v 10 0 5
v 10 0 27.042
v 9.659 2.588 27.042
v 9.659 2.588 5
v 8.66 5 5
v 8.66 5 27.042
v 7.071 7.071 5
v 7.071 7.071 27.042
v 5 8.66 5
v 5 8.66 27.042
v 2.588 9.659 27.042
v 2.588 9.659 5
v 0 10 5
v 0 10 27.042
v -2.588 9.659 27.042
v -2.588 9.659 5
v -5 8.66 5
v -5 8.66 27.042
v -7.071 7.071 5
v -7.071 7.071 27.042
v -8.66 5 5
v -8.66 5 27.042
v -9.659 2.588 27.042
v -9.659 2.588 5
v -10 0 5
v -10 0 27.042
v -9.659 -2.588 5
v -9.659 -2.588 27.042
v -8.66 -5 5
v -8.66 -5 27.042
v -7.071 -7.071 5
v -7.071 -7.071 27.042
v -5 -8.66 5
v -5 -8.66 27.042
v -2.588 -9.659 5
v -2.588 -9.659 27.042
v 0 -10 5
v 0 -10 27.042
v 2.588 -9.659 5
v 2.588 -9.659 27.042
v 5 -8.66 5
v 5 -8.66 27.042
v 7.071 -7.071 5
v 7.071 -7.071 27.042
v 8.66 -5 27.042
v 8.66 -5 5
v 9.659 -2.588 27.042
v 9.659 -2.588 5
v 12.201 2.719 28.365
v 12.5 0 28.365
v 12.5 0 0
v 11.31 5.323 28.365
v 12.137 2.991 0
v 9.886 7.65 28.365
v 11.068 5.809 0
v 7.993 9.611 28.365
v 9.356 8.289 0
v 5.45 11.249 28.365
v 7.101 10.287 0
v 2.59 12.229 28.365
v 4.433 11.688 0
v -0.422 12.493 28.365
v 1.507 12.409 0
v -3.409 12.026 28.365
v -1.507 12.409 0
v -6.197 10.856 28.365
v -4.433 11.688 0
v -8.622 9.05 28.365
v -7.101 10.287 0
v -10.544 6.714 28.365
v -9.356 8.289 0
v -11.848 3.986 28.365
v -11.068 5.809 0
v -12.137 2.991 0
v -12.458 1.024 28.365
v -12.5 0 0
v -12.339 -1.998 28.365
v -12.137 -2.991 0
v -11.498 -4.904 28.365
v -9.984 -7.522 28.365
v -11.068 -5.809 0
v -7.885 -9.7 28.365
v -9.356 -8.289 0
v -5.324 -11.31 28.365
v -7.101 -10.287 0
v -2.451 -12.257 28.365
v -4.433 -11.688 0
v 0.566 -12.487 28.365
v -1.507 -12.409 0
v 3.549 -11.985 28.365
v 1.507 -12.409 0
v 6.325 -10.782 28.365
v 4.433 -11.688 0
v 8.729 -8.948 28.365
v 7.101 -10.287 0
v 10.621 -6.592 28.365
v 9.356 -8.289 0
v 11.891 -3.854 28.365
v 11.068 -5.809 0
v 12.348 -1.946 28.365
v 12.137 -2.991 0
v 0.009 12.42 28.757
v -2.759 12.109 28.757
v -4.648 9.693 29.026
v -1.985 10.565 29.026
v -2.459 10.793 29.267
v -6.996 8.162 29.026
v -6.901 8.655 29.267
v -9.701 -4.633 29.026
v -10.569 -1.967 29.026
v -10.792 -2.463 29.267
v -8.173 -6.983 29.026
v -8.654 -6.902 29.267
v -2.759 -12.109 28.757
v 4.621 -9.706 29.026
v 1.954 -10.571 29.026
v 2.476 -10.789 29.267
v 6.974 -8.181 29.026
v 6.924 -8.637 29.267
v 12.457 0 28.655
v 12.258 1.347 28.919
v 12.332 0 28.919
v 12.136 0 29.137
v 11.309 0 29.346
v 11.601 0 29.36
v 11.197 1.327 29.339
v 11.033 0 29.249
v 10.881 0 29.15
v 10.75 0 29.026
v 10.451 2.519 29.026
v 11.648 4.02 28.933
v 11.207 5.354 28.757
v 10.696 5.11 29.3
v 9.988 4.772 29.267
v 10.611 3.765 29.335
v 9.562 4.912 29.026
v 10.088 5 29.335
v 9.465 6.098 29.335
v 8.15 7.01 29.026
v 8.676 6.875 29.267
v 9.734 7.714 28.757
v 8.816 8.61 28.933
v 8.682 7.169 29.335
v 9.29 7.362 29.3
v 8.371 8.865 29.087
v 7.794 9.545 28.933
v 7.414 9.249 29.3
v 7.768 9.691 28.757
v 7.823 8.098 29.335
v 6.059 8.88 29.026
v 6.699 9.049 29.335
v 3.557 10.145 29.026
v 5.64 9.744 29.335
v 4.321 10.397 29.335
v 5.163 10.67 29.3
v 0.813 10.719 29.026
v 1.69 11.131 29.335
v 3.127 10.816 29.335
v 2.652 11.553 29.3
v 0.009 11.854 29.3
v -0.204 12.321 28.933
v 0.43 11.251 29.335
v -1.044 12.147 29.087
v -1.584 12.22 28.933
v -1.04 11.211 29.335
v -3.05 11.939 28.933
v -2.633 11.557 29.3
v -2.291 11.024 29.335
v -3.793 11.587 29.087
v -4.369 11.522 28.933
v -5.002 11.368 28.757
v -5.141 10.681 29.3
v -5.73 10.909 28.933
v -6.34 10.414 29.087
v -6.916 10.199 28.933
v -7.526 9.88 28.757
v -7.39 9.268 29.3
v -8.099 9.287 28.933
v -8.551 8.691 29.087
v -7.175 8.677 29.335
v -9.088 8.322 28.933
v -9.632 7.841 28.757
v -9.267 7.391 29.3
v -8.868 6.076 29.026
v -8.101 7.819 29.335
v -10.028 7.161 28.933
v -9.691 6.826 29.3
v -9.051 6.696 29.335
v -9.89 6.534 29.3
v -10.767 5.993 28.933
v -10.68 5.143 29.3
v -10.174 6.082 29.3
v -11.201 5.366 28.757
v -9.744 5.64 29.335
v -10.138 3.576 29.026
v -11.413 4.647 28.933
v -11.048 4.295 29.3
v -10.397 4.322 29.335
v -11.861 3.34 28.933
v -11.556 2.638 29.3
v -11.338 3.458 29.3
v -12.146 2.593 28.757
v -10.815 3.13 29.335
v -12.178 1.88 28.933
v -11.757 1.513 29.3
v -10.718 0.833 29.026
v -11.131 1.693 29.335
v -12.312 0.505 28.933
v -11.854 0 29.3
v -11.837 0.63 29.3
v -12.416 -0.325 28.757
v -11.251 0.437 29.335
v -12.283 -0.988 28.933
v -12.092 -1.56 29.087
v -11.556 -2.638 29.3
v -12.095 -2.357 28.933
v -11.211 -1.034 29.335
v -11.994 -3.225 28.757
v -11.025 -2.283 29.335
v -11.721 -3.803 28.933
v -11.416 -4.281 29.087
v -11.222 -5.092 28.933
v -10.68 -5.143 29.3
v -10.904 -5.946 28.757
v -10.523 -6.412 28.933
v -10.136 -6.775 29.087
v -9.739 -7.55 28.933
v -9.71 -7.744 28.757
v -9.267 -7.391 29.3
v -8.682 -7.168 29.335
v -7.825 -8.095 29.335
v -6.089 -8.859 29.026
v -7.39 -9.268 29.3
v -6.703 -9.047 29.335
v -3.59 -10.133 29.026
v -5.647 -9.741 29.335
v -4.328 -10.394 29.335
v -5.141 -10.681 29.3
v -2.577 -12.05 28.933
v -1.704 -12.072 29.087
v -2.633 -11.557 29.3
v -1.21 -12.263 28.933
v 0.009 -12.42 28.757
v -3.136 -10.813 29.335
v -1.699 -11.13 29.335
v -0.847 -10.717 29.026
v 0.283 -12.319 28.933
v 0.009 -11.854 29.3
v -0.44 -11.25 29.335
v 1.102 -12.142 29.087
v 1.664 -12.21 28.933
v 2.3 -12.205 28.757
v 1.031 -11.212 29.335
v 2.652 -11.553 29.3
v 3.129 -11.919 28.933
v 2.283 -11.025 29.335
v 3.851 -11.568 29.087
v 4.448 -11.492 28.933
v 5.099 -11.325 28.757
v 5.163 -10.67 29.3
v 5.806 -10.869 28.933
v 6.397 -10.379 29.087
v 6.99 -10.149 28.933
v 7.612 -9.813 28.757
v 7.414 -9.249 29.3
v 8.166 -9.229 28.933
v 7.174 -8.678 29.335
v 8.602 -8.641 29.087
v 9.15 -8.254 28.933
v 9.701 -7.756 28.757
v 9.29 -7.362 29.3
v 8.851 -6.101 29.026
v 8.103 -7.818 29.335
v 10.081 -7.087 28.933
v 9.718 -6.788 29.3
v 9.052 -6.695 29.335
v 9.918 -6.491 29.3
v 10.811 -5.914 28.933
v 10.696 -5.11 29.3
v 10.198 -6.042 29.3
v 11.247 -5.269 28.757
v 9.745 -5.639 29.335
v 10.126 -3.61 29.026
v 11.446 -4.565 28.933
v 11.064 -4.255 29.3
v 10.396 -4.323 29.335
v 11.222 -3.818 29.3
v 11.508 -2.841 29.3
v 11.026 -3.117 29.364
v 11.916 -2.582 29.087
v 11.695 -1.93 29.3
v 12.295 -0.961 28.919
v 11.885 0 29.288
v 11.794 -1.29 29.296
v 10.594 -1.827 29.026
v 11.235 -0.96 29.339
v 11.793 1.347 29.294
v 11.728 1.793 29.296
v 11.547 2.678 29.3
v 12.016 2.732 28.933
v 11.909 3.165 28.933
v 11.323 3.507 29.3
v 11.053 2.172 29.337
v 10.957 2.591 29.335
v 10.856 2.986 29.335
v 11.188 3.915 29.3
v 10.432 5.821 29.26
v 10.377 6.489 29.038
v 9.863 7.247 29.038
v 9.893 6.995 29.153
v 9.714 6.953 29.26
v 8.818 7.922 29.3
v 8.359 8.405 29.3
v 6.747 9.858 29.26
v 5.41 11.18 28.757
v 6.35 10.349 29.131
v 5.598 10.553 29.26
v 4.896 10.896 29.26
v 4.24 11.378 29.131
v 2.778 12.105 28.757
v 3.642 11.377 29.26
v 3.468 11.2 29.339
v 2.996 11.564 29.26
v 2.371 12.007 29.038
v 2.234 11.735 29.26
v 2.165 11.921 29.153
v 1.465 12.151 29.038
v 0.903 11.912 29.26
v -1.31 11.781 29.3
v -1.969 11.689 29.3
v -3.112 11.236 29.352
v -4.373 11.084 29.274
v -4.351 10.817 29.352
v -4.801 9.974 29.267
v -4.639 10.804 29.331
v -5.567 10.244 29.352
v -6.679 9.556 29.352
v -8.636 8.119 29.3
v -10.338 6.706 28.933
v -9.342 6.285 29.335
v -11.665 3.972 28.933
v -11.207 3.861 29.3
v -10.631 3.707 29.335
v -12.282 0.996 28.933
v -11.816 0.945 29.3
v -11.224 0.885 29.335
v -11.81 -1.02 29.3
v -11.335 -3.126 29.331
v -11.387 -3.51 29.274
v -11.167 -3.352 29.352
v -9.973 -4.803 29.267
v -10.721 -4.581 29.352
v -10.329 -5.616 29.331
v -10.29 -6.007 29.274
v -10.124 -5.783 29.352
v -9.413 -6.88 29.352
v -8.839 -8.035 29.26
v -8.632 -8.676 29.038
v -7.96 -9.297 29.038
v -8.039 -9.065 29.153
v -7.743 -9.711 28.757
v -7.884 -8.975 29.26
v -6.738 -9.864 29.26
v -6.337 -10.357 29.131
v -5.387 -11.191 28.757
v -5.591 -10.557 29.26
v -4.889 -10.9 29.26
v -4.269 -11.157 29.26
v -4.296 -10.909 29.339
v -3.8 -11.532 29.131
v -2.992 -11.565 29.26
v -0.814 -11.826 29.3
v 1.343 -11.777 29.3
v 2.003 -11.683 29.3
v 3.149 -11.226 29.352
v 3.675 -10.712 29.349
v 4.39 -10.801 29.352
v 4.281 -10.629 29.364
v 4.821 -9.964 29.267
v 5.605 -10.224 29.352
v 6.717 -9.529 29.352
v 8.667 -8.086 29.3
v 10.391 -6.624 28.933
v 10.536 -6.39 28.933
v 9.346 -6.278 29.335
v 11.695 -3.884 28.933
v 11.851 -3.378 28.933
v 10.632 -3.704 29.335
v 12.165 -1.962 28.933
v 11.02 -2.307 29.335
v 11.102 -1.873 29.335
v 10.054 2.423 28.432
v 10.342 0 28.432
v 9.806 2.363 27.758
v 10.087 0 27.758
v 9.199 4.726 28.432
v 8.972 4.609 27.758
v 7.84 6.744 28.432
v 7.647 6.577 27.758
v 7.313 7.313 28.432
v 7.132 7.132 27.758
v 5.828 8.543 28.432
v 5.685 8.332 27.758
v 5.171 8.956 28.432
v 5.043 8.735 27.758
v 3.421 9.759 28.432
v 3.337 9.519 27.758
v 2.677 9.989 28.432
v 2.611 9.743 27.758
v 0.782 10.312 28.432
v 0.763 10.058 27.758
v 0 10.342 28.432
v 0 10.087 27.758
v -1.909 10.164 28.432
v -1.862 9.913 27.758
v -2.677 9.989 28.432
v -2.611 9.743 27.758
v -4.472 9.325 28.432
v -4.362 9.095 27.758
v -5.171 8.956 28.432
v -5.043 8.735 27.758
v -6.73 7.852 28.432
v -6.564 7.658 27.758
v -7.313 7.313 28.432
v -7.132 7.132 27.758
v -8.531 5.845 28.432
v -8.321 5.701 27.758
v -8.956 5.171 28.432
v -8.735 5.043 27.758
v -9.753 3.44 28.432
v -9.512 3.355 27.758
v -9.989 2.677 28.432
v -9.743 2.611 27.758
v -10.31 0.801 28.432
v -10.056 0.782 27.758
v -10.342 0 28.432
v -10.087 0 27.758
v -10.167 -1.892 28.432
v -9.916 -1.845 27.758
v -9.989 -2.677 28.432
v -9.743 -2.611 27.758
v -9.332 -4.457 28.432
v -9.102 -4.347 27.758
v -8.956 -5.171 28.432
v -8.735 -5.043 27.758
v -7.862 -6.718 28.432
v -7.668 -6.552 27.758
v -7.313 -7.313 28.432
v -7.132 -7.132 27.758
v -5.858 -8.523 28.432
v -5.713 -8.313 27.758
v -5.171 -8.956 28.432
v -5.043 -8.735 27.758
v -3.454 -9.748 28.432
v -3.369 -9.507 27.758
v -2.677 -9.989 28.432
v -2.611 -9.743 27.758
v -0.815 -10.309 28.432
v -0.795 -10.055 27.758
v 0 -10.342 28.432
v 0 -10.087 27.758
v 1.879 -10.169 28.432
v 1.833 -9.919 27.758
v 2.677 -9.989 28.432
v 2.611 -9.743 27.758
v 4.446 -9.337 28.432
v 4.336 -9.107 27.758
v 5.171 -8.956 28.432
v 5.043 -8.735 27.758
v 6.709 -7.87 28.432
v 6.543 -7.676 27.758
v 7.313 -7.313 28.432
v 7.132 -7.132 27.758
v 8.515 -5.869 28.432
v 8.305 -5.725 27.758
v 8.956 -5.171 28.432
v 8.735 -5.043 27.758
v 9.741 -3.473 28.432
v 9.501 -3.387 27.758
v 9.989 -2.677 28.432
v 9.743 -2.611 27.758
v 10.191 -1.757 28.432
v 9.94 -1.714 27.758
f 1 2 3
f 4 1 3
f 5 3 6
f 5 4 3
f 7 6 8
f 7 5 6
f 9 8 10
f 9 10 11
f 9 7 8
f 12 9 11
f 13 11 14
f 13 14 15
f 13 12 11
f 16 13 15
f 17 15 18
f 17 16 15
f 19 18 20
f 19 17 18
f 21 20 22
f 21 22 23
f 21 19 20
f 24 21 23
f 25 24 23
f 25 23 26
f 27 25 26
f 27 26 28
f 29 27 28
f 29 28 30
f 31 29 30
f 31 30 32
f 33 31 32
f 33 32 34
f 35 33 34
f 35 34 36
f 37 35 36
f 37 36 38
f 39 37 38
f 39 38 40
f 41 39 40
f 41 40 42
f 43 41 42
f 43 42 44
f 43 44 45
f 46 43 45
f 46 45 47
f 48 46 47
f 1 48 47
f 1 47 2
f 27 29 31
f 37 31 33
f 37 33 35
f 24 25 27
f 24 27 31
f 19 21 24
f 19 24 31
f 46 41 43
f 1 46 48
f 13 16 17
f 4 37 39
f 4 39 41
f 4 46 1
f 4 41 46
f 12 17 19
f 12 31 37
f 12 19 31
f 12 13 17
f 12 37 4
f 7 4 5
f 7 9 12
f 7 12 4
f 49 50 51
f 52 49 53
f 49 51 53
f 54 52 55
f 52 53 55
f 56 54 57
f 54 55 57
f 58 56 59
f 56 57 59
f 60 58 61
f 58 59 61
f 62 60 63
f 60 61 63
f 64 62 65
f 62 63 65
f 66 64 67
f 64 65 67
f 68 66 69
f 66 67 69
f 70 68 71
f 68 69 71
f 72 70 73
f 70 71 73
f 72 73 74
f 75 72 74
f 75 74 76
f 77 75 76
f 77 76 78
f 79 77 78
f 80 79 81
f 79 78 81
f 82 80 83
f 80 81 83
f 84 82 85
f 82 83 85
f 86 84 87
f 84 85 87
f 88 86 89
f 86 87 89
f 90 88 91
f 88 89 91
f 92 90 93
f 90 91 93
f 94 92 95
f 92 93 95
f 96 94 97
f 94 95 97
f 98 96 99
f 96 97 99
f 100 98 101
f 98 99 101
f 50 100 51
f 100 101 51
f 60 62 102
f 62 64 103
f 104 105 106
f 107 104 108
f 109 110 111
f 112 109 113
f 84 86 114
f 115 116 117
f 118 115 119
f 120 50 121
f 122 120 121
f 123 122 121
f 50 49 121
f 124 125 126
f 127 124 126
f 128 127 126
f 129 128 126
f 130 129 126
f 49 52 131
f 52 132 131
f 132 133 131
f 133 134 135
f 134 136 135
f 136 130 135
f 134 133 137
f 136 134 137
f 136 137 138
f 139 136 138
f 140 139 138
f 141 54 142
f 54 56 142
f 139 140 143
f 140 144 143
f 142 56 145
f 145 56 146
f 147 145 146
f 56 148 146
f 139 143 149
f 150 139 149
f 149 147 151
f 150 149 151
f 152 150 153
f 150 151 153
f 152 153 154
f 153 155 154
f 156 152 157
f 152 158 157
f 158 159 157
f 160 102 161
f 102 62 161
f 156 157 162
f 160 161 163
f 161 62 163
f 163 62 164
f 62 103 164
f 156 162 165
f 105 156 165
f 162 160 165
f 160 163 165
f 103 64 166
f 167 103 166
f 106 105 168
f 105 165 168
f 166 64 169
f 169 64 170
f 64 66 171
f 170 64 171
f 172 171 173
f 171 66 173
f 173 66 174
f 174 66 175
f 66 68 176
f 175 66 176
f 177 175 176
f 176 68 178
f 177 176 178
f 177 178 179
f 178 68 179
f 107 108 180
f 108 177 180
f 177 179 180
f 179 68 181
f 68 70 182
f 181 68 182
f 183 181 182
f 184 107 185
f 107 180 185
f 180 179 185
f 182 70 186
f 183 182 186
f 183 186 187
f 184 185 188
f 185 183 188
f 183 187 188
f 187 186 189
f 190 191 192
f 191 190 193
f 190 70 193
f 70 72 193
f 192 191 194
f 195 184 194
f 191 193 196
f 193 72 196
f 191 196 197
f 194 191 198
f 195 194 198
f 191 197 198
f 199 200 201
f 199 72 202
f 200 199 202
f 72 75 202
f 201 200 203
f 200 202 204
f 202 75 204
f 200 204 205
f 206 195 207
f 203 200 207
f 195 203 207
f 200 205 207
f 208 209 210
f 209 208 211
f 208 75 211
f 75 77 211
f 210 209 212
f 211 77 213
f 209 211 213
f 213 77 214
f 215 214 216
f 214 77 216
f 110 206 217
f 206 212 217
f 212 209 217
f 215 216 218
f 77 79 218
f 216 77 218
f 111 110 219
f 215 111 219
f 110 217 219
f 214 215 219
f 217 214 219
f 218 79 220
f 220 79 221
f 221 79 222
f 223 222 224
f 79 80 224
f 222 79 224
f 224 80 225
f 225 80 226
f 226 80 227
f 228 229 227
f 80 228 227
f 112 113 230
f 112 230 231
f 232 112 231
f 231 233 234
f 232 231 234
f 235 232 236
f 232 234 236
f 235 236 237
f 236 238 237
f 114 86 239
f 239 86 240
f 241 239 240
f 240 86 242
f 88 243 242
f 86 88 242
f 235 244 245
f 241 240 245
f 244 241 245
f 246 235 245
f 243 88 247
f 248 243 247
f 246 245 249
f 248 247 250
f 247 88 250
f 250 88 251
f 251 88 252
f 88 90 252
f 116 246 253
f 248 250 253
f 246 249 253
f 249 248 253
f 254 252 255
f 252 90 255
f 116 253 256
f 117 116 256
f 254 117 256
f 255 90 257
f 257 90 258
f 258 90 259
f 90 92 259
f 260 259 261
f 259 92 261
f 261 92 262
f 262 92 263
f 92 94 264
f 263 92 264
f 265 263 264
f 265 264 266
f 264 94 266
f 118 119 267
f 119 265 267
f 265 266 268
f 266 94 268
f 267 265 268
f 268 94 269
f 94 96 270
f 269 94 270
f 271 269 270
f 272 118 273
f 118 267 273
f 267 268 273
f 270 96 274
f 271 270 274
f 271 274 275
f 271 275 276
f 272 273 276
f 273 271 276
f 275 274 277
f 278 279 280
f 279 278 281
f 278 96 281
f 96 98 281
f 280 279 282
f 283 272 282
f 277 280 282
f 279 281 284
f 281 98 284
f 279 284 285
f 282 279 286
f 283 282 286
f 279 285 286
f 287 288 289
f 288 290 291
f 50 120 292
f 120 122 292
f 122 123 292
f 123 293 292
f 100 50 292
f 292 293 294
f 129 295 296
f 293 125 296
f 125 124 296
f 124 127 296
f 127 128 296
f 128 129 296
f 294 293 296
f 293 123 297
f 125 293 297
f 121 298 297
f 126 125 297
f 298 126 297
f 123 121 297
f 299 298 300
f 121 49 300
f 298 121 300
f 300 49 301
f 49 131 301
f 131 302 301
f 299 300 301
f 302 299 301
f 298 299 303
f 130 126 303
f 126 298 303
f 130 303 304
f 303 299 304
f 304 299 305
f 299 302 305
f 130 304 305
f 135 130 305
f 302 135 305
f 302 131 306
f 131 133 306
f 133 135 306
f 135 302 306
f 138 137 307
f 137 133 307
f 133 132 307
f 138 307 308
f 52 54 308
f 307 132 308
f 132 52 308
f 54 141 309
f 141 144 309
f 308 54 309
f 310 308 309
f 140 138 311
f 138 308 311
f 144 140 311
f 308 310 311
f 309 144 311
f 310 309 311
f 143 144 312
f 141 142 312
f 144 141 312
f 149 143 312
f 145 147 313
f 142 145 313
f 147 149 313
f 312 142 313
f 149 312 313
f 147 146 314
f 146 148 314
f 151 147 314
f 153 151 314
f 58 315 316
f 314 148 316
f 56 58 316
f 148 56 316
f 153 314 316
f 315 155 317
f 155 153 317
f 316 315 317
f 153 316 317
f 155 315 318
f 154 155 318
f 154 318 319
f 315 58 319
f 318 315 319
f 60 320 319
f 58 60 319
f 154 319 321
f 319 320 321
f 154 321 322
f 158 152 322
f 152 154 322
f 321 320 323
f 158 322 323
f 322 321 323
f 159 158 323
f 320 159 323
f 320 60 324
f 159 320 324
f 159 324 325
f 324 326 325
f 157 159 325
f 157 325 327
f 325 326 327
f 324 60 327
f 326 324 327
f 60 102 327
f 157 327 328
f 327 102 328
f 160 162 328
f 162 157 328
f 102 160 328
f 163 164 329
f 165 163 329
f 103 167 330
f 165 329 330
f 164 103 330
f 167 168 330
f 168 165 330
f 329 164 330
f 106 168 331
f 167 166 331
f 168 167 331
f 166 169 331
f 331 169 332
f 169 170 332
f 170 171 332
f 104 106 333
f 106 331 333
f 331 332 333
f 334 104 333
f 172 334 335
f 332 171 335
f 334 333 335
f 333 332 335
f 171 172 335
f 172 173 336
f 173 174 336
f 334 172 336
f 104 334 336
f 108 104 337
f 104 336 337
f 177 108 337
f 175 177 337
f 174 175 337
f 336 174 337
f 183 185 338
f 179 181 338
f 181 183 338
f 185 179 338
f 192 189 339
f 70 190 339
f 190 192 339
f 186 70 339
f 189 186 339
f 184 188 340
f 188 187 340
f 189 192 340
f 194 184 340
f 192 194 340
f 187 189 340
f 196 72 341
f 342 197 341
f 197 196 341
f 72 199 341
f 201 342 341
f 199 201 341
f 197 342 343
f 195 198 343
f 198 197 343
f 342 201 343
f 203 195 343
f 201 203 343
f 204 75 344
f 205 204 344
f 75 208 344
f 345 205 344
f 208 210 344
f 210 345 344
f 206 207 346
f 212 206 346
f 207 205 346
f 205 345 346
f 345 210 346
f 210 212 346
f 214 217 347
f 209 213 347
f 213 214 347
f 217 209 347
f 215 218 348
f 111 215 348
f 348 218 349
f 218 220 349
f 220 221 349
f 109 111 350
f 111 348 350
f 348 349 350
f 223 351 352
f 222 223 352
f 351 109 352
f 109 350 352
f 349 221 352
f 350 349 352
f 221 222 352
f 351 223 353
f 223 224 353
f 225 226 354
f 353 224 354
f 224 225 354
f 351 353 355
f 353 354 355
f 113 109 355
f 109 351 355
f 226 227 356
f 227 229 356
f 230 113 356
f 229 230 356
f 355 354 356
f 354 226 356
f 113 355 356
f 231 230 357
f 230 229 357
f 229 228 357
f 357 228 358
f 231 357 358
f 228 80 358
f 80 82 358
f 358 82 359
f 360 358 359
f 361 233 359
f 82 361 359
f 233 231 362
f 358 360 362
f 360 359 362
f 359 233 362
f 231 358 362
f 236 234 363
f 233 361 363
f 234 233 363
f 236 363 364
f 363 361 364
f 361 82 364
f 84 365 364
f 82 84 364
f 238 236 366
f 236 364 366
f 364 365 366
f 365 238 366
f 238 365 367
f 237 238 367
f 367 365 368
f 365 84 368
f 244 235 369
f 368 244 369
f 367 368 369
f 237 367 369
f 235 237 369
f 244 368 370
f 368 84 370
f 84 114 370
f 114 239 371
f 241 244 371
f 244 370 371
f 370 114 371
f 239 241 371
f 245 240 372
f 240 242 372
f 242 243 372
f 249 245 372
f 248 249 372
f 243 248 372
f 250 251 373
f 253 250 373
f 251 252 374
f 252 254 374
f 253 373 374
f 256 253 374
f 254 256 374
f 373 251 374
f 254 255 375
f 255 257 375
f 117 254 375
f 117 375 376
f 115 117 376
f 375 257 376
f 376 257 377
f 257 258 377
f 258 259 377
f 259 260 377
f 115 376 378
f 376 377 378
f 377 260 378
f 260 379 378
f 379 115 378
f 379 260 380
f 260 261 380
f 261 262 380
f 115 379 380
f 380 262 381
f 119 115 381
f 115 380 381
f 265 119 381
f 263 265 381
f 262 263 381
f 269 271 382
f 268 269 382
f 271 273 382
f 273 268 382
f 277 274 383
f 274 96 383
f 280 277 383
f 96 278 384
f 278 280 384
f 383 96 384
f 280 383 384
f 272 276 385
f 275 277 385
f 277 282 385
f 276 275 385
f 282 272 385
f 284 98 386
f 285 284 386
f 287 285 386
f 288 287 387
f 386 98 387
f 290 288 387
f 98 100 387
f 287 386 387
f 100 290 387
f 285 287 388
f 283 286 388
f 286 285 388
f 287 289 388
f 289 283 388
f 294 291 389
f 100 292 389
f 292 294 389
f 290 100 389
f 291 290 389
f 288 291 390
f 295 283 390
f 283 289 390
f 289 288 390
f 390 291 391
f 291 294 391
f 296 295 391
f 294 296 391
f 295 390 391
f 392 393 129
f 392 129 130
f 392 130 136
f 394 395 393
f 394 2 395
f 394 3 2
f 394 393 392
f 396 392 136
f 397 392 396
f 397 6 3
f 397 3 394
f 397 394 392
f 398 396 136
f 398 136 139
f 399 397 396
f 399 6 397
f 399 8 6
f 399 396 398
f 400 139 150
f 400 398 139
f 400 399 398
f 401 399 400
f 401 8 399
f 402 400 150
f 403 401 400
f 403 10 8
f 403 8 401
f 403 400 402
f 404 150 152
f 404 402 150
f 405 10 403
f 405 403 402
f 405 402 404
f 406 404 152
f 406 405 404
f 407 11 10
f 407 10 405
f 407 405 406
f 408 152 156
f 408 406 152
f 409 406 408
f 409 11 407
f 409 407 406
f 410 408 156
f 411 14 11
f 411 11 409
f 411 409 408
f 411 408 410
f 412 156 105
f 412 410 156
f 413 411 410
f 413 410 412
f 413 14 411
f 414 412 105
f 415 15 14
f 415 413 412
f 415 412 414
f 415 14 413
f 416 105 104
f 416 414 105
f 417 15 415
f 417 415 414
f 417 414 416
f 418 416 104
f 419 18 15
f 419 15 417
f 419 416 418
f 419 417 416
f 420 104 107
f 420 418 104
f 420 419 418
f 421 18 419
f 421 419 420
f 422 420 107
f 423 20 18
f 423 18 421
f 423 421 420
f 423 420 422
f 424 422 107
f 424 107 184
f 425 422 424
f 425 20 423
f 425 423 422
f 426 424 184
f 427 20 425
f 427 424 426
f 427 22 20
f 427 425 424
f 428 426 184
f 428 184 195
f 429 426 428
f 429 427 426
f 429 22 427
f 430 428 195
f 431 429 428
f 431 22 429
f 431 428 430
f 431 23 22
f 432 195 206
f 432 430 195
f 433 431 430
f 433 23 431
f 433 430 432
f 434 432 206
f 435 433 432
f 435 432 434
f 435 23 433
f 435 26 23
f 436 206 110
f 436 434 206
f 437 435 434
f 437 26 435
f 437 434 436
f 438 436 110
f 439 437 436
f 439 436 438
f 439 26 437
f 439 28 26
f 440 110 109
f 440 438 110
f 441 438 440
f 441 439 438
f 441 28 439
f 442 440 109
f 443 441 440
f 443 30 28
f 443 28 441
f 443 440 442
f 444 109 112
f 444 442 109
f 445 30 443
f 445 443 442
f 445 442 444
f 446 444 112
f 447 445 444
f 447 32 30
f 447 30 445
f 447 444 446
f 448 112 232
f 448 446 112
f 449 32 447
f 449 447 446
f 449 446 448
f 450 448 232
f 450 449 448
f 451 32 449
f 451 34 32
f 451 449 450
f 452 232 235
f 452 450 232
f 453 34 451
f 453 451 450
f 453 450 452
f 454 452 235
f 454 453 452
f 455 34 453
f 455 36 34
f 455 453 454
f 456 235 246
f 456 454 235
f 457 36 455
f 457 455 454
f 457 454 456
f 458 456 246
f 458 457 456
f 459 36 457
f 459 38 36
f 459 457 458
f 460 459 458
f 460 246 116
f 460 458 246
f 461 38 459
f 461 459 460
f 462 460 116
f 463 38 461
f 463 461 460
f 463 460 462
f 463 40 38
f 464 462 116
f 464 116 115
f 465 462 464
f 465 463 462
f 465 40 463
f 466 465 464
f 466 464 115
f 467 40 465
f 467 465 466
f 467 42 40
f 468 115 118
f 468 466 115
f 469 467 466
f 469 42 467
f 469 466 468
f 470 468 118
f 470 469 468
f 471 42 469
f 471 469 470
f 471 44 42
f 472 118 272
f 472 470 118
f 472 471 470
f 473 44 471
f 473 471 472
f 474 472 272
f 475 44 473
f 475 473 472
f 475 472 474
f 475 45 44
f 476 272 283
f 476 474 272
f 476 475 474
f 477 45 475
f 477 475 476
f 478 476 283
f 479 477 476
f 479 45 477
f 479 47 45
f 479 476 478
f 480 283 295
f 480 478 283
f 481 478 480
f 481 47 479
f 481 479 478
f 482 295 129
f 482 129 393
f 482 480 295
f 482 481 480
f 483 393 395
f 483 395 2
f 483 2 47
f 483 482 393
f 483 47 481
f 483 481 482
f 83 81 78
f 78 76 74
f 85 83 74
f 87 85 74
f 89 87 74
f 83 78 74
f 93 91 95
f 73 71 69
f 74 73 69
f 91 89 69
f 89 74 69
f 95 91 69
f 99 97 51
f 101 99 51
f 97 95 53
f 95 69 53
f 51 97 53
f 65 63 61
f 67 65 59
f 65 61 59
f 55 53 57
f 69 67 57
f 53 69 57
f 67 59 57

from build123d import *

# Parameters (mm, degrees)
F0_R     = 10
F1_DEPTH = 5
F0_R_2   = 12.5
F2_DEPTH = 30
F4_R     = 1


# Not quite as in the source:
# - a fillet or chamfer that OpenCascade refuses, or shapes differently, is made with other operations: its cross-section is extruded or revolved along the edge and cut away or added


with BuildPart() as f1:
    # F0 (on Top) → F1 (new body)
    with BuildSketch(Plane.XY):
        Circle(F0_R)
    extrude(amount=F1_DEPTH)

    # F0 (on Top) → F2 (join)
    with BuildSketch(Plane.XY):
        Circle(F0_R_2)
        Circle(F0_R, mode=Mode.SUBTRACT)
    extrude(amount=F2_DEPTH)

    # F3: fillet of radius 3 on 1 edges, made by hand

    # F3_s1 → F3_t2 (revolve, cut)
    with BuildSketch(Plane.XZ):
        with BuildLine():
            ThreePointArc((12.5, 30), (10.7087121525, 28.9784517816), (10, 27.0419601084))
            Line((10, 27.0419601084), (10, 30))
            Line((10, 30), (12.5, 30))
        make_face()
    revolve(axis=Axis((0, 0, 30), (0, 0, 1)), mode=Mode.SUBTRACT)

    # F4
    f4_edges = [f1.edges().sort_by_distance(p)[0] for p in [
        (-12.5, 0, 30),
    ]]
    fillet(f4_edges, radius=F4_R)


solid = f1.part
